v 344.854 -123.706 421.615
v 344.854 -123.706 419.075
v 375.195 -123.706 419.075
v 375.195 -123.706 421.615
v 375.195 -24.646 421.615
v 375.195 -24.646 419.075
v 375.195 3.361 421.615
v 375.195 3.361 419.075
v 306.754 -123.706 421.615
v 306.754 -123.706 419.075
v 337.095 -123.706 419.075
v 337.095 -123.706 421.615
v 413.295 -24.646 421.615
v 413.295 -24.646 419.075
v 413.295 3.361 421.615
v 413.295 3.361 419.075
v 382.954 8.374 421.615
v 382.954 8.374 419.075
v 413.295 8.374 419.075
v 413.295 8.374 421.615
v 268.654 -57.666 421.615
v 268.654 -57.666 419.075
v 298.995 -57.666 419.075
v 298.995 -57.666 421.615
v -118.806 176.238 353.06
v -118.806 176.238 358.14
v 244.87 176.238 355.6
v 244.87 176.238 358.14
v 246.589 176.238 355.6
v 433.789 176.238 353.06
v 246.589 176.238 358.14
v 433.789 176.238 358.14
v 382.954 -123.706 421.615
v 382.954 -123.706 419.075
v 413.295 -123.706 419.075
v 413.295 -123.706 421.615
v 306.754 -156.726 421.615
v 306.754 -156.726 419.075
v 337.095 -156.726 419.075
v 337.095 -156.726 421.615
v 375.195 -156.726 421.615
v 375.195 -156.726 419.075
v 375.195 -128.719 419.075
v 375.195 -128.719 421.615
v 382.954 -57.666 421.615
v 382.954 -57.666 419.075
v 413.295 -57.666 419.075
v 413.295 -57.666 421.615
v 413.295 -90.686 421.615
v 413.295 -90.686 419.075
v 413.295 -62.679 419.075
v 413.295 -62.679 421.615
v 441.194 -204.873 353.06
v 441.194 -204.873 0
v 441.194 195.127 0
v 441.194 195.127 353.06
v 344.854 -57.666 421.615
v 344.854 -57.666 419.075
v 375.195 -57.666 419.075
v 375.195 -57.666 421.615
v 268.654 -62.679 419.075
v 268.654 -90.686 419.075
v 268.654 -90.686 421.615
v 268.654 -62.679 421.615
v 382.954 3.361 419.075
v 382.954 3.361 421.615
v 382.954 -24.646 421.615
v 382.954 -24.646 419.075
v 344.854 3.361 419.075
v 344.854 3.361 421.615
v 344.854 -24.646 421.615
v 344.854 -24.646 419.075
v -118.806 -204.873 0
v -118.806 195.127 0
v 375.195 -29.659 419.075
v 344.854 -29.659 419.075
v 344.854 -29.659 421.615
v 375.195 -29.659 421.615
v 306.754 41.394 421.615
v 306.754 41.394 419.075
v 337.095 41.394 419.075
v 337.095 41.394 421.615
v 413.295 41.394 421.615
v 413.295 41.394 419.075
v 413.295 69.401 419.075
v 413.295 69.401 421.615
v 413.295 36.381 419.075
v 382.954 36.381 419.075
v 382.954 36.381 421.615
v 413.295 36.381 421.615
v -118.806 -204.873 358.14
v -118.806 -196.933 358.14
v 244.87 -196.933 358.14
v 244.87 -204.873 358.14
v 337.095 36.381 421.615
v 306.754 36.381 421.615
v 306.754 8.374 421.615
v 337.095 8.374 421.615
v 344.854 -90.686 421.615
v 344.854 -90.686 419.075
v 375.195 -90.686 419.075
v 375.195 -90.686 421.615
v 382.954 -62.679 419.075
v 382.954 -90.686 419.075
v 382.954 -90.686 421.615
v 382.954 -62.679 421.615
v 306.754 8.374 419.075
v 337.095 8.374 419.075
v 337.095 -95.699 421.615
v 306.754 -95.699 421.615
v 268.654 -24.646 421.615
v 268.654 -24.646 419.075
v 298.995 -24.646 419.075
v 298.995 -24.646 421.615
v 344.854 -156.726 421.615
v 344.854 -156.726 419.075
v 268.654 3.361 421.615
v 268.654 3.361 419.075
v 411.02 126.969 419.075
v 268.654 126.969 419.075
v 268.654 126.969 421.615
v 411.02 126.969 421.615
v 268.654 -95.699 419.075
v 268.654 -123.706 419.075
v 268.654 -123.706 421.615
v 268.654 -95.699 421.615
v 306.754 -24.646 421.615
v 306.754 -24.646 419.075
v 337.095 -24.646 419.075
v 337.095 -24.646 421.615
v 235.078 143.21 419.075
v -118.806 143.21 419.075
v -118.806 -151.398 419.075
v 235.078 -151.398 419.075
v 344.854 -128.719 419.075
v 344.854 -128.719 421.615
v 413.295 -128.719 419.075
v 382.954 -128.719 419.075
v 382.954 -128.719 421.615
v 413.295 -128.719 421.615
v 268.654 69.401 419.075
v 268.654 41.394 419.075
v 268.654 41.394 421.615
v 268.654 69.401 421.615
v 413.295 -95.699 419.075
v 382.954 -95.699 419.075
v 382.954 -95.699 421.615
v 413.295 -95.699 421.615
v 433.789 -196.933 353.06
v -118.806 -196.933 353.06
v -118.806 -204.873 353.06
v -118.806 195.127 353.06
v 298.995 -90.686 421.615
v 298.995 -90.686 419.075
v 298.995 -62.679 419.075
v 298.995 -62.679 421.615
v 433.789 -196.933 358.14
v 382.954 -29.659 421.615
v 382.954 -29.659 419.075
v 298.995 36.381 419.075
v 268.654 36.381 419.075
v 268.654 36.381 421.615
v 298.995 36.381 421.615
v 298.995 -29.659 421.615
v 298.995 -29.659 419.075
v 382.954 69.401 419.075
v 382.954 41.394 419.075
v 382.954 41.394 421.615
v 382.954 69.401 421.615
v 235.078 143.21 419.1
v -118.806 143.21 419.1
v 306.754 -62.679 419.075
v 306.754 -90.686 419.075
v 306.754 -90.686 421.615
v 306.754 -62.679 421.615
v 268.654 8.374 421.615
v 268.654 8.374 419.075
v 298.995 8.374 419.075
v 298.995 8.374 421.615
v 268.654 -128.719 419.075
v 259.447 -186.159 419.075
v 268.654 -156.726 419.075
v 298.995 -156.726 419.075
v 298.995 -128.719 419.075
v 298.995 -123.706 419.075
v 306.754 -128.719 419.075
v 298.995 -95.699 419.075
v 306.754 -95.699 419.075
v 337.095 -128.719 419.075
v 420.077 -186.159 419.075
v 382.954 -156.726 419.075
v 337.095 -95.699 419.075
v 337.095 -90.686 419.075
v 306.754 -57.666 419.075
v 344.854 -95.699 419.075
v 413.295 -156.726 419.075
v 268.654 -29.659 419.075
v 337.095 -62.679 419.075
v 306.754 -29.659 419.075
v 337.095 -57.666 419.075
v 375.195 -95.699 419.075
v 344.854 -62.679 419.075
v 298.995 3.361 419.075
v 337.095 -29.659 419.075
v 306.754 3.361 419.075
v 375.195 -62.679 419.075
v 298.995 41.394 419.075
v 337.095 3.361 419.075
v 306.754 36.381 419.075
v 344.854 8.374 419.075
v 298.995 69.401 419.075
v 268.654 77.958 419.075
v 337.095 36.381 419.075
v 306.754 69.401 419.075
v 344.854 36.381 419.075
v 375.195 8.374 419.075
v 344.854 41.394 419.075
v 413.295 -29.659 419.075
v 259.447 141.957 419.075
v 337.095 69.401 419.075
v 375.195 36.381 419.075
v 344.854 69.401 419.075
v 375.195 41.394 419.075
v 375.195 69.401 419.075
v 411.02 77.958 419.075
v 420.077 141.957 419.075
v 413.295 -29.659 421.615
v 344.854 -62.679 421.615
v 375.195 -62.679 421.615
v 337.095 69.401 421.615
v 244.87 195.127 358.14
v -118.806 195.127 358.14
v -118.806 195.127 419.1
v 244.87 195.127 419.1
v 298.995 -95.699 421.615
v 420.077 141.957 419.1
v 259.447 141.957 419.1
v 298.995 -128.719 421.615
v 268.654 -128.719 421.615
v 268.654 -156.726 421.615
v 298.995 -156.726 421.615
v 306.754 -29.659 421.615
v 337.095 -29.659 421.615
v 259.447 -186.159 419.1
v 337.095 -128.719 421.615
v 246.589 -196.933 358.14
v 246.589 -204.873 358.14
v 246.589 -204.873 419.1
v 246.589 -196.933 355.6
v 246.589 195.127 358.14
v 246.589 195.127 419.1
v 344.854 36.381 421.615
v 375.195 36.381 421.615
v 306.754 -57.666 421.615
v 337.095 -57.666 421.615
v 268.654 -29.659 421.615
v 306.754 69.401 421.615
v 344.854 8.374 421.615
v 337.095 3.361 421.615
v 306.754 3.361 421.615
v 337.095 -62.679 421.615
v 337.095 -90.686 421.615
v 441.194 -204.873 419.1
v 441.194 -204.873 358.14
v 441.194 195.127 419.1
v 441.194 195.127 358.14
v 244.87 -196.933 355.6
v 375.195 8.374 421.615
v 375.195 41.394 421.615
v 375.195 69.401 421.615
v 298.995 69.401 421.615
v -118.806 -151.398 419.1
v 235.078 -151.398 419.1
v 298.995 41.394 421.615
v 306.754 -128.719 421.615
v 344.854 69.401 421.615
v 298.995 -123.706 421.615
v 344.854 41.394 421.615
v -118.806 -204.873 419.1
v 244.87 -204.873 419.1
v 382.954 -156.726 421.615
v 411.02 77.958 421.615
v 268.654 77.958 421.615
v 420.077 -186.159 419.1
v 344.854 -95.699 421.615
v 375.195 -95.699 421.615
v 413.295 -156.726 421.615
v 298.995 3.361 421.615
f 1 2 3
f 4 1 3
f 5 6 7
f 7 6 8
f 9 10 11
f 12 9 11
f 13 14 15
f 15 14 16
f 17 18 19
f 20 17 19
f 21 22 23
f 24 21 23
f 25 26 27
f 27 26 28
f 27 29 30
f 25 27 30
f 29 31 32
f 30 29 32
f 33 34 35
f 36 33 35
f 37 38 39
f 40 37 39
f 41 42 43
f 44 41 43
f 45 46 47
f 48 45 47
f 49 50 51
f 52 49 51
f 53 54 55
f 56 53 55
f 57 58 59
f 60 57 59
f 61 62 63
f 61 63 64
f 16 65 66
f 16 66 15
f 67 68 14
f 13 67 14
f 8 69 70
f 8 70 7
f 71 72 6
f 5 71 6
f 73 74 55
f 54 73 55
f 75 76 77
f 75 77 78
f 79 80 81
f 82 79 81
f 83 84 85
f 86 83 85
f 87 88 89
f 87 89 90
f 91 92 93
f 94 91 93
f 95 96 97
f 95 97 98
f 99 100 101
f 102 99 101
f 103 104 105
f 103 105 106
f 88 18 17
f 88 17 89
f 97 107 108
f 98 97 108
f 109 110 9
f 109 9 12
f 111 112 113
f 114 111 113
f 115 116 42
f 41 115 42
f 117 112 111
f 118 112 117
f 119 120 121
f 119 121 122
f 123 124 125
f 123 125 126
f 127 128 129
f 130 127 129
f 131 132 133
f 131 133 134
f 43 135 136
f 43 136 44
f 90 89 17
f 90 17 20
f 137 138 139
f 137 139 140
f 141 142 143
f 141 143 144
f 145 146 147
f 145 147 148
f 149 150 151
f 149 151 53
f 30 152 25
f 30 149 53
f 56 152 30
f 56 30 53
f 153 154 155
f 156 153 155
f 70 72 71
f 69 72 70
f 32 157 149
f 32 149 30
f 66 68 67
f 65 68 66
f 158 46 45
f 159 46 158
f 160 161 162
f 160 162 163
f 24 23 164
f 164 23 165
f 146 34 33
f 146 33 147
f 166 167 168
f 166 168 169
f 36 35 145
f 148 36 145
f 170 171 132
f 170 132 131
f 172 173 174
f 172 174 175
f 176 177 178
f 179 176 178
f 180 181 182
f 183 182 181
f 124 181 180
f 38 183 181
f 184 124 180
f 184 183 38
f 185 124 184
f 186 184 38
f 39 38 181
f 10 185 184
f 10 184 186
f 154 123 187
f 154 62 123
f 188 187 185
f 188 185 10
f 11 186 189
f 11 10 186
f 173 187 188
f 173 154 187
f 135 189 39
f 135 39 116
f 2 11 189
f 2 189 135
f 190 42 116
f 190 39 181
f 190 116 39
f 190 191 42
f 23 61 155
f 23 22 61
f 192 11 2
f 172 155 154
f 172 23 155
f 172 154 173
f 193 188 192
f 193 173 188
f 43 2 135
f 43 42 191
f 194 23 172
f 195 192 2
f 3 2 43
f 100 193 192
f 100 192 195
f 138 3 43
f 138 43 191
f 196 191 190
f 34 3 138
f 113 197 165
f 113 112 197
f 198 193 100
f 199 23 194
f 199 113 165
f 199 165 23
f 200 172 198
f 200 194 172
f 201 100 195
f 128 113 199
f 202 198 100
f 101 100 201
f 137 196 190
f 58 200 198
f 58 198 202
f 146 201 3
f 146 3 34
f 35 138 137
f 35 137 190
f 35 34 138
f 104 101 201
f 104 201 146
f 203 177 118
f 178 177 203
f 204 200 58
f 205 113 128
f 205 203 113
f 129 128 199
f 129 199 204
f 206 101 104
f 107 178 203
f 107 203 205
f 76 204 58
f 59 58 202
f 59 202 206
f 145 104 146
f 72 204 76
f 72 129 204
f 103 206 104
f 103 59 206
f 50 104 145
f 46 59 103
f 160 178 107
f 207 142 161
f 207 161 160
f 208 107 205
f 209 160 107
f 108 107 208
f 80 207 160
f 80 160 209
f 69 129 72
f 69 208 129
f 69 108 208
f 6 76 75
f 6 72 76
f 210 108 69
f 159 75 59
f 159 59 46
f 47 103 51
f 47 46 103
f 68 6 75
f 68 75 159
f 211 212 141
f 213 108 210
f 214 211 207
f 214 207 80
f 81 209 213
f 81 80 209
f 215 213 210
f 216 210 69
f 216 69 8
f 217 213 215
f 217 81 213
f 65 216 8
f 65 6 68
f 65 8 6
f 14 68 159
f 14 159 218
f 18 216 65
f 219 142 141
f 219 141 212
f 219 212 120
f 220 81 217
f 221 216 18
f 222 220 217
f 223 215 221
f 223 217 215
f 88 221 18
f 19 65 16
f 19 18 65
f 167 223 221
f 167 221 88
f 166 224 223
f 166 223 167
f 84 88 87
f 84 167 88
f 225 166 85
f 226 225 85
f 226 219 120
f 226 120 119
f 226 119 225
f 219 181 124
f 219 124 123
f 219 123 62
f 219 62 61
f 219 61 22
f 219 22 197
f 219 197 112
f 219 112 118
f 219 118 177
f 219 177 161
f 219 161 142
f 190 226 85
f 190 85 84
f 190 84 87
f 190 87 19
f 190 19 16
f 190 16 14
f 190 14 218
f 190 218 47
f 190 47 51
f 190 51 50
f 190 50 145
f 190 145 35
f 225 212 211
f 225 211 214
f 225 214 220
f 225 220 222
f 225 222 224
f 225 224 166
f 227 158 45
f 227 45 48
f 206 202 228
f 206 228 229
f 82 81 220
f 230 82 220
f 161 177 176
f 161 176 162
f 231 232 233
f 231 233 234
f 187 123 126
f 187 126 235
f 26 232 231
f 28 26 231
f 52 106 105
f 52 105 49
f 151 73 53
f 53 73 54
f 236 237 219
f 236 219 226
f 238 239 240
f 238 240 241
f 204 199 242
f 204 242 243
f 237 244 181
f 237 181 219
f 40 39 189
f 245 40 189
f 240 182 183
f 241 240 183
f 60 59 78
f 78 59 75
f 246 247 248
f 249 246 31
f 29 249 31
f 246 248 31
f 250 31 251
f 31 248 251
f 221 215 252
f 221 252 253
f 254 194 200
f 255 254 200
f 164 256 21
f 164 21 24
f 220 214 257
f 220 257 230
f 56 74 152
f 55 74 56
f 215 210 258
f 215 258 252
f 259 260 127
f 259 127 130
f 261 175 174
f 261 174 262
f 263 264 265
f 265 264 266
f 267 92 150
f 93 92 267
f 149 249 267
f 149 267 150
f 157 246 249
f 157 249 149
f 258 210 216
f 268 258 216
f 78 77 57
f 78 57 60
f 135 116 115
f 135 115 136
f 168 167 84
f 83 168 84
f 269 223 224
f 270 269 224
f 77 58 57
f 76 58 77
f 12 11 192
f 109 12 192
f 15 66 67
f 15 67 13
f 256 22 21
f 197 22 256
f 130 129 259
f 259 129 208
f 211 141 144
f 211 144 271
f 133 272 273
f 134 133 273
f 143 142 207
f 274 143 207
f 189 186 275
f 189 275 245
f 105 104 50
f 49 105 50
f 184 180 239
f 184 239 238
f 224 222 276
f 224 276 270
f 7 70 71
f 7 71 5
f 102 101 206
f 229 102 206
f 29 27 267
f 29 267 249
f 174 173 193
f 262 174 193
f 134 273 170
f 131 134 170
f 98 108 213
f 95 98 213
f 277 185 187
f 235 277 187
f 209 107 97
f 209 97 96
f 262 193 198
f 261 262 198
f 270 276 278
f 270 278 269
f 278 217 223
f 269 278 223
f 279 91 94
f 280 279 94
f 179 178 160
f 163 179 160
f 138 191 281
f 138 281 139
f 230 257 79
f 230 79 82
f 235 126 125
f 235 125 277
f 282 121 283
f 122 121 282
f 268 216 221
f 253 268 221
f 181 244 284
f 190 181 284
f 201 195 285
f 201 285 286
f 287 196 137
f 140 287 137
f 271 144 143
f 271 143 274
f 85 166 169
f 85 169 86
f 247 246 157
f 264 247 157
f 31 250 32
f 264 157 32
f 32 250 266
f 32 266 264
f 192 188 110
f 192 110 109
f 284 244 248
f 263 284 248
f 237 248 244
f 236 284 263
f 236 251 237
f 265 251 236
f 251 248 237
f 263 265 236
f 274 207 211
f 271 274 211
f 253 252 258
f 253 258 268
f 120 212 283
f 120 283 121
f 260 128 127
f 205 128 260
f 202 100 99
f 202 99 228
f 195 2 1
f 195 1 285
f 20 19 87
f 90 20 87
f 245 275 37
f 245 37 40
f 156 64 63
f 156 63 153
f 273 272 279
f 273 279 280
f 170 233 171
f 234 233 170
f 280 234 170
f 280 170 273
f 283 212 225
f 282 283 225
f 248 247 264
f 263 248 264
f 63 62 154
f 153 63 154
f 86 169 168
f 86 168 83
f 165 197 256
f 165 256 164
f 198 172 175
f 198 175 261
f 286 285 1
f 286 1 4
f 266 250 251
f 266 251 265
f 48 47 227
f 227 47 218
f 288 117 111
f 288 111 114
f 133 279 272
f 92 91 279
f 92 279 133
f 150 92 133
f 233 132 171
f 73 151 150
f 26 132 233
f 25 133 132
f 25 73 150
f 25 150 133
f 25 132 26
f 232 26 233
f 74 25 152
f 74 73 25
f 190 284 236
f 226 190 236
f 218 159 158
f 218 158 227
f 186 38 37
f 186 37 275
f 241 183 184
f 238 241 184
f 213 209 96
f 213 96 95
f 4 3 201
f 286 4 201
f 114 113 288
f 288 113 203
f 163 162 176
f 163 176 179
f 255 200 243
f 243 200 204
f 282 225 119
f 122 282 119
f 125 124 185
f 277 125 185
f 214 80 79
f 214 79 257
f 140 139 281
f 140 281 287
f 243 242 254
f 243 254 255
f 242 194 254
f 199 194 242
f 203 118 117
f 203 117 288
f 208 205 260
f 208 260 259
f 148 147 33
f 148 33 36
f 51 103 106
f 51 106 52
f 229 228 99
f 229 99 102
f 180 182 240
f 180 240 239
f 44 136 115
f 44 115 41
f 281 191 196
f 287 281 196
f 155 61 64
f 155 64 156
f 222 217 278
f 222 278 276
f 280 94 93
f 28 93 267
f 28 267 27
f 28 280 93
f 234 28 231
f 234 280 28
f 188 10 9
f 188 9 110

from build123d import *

# Parameters (mm, degrees)
SKETCH1_W           = 560
SKETCH1_H           = 400
BOSS_EXTRUDE1_DEPTH = 419.1
SKETCH2_W           = 509.762265323
SKETCH2_H           = 294.60835285
SKETCH2_W_2         = 160.630106896
SKETCH2_H_2         = 328.11637689
CUT_EXTRUDE1_DEPTH  = 0.0254
CUT_EXTRUDE2_START  = -60.96
SKETCH3_W           = 758.952
SKETCH3_H           = 400
SKETCH3_W_2         = 745.362874068
SKETCH3_H_2         = 373.171162969
CUT_EXTRUDE2_DEPTH  = 5.08
SKETCH5_W           = 30.340291286
SKETCH5_H           = 28.006422725
SKETCH5_W_2         = 142.365982185
SKETCH5_H_2         = 49.011239769
BOSS_EXTRUDE3_DEPTH = 2.54
SKETCH6_W           = 1.719763346
SKETCH6_H           = 400
CUT_EXTRUDE3_DEPTH  = 63.5


with BuildPart() as part:
    # Sketch1 → Boss-Extrude1 (new body)
    with BuildSketch(Plane.XY):
        with Locations((161.193919926, -4.872504675)):
            Rectangle(SKETCH1_W, SKETCH1_H)
    extrude(amount=BOSS_EXTRUDE1_DEPTH)

    # Sketch2 → Cut-Extrude1 (cut)
    with BuildSketch(Plane.XY.offset(419.1)):
        with Locations((-19.802766229, -4.093923129)):
            Rectangle(SKETCH2_W, SKETCH2_H)
        with Locations((339.761572352, -22.10119724)):
            Rectangle(SKETCH2_W_2, SKETCH2_H_2)
    extrude(amount=-CUT_EXTRUDE1_DEPTH, mode=Mode.SUBTRACT)

    # Sketch3 → Cut-Extrude2 (cut)
    with BuildSketch(Plane.XY.offset(419.1).offset(CUT_EXTRUDE2_START)):
        with Locations((61.717919926, -4.872504675)):
            Rectangle(SKETCH3_W, SKETCH3_H)
        with Locations((61.107514964, -10.347774784)):
            Rectangle(SKETCH3_W_2, SKETCH3_H_2, mode=Mode.SUBTRACT)
    extrude(amount=-CUT_EXTRUDE2_DEPTH, mode=Mode.SUBTRACT)

    # Sketch5 → Boss-Extrude3 (add)
    with BuildSketch(Plane.XY.offset(419.0746)):
        with Locations((321.924411259, 55.397530231)):
            Rectangle(SKETCH5_W, SKETCH5_H)
        with Locations((339.837256709, 102.463879533)):
            Rectangle(SKETCH5_W_2, SKETCH5_H_2)
        with Locations((283.824411259, 55.397530231)):
            Rectangle(SKETCH5_W, SKETCH5_H)
        with Locations((360.024411259, 55.397530231)):
            Rectangle(SKETCH5_W, SKETCH5_H)
        with Locations((398.124411259, 55.397530231)):
            Rectangle(SKETCH5_W, SKETCH5_H)
        with Locations((321.924411259, 22.377530231)):
            Rectangle(SKETCH5_W, SKETCH5_H)
        with Locations((360.024411259, 22.377530231)):
            Rectangle(SKETCH5_W, SKETCH5_H)
        with Locations((398.124411259, 22.377530231)):
            Rectangle(SKETCH5_W, SKETCH5_H)
        with Locations((321.924411259, -10.642469769)):
            Rectangle(SKETCH5_W, SKETCH5_H)
        with Locations((360.024411259, -10.642469769)):
            Rectangle(SKETCH5_W, SKETCH5_H)
        with Locations((398.124411259, -10.642469769)):
            Rectangle(SKETCH5_W, SKETCH5_H)
        with Locations((321.924411259, -43.66246977)):
            Rectangle(SKETCH5_W, SKETCH5_H)
        with Locations((360.024411259, -43.66246977)):
            Rectangle(SKETCH5_W, SKETCH5_H)
        with Locations((398.124411259, -43.66246977)):
            Rectangle(SKETCH5_W, SKETCH5_H)
        with Locations((321.924411259, -76.68246977)):
            Rectangle(SKETCH5_W, SKETCH5_H)
        with Locations((360.024411259, -76.68246977)):
            Rectangle(SKETCH5_W, SKETCH5_H)
        with Locations((398.124411259, -76.68246977)):
            Rectangle(SKETCH5_W, SKETCH5_H)
        with Locations((321.924411259, -109.702469769)):
            Rectangle(SKETCH5_W, SKETCH5_H)
        with Locations((360.024411259, -109.702469769)):
            Rectangle(SKETCH5_W, SKETCH5_H)
        with Locations((398.124411259, -109.702469769)):
            Rectangle(SKETCH5_W, SKETCH5_H)
        with Locations((321.924411259, -142.72246977)):
            Rectangle(SKETCH5_W, SKETCH5_H)
        with Locations((360.024411259, -142.72246977)):
            Rectangle(SKETCH5_W, SKETCH5_H)
        with Locations((398.124411259, -142.72246977)):
            Rectangle(SKETCH5_W, SKETCH5_H)
        with Locations((283.824411259, 22.377530231)):
            Rectangle(SKETCH5_W, SKETCH5_H)
        with Locations((283.824411259, -10.642469769)):
            Rectangle(SKETCH5_W, SKETCH5_H)
        with Locations((283.824411259, -43.66246977)):
            Rectangle(SKETCH5_W, SKETCH5_H)
        with Locations((283.824411259, -76.68246977)):
            Rectangle(SKETCH5_W, SKETCH5_H)
        with Locations((283.824411259, -109.702469769)):
            Rectangle(SKETCH5_W, SKETCH5_H)
        with Locations((283.824411259, -142.72246977)):
            Rectangle(SKETCH5_W, SKETCH5_H)
    extrude(amount=BOSS_EXTRUDE3_DEPTH)

    # Sketch6 → Cut-Extrude3 (cut)
    with BuildSketch(Plane.XY.offset(419.1)):
        with Locations((245.729481122, -4.872504675)):
            Rectangle(SKETCH6_W, SKETCH6_H)
    extrude(amount=-CUT_EXTRUDE3_DEPTH, mode=Mode.SUBTRACT)


solid = part.part
